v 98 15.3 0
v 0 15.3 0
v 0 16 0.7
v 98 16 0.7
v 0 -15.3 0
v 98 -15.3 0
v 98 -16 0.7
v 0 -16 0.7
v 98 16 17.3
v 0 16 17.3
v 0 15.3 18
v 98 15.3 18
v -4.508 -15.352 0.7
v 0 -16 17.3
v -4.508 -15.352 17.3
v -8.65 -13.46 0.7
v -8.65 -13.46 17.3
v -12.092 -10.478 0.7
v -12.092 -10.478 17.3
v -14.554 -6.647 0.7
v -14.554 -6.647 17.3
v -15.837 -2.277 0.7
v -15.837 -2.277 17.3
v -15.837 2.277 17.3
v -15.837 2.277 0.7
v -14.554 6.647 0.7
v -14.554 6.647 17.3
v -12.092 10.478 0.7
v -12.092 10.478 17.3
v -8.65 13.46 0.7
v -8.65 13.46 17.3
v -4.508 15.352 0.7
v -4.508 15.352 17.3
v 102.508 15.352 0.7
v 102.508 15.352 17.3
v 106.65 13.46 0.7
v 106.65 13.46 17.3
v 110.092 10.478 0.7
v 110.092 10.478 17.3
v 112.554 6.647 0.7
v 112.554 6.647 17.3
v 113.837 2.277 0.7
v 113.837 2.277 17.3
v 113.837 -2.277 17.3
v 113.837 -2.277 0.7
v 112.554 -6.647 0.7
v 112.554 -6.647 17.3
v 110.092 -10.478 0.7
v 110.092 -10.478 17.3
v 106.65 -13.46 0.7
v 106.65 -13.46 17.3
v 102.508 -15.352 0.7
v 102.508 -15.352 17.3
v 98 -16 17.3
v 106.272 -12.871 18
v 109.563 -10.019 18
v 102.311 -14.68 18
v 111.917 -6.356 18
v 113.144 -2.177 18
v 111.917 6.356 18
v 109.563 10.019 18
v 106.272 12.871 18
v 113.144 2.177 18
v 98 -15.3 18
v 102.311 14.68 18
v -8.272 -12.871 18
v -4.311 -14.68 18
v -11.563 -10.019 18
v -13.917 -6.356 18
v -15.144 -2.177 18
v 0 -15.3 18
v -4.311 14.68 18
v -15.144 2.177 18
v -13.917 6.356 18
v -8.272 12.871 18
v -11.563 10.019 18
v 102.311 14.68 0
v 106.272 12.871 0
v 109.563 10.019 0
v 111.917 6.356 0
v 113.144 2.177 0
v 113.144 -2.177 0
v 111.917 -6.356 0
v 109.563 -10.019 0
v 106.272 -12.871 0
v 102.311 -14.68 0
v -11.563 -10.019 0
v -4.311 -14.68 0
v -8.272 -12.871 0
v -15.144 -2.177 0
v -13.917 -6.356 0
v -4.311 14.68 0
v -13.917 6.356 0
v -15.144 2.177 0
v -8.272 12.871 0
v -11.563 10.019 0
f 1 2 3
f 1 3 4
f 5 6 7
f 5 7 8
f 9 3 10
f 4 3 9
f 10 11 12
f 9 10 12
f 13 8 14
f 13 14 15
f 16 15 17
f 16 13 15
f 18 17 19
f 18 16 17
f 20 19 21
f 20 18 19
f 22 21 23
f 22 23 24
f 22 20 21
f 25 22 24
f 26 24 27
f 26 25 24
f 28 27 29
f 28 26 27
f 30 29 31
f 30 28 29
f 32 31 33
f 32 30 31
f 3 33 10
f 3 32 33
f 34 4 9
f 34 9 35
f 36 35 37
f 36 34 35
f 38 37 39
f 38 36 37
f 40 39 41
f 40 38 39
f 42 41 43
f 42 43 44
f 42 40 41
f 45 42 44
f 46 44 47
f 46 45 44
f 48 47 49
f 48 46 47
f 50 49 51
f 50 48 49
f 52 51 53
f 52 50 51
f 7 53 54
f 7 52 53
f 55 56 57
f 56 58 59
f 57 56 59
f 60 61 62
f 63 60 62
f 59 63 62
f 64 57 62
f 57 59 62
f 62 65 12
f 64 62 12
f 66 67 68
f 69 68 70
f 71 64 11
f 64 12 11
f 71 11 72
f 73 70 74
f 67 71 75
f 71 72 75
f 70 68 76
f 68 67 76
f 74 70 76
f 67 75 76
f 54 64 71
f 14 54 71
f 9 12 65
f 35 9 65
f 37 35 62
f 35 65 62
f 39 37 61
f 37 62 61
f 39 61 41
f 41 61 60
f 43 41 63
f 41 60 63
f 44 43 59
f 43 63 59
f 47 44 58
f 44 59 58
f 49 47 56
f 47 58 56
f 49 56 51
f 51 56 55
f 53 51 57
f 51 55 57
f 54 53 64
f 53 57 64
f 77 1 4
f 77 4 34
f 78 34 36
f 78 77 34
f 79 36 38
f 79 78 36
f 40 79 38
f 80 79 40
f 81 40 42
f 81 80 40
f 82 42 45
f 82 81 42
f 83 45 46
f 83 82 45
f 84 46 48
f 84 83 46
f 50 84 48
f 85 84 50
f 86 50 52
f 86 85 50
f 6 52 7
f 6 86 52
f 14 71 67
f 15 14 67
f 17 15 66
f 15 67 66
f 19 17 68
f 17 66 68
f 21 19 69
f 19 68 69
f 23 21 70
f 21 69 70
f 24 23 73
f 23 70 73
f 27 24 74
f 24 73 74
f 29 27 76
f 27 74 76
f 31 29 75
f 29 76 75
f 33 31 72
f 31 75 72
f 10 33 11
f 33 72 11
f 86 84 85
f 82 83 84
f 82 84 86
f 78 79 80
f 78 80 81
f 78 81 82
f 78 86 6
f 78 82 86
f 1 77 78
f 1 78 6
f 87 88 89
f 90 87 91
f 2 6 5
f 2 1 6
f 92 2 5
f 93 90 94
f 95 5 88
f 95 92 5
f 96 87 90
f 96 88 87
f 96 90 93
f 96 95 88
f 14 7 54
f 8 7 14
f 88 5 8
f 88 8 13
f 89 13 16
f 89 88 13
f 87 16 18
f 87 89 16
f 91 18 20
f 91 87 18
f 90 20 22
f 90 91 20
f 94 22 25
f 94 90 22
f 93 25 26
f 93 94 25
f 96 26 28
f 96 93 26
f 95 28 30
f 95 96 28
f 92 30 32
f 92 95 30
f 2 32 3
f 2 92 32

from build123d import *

# Parameters (mm, degrees)
ESTRUSIONE_ESTRUSIONE1_DEPTH = 18
SMUSSO1_SIZE                 = 0.7


with BuildPart() as part:
    # Schizzo1 → Estrusione-Estrusione1 (new body)
    with BuildSketch(Plane.XY):
        with BuildLine():
            Line((0, 16), (98, 16))
            ThreePointArc((98, 16), (114, 0), (98, -16))
            Line((98, -16), (0, -16))
            ThreePointArc((0, -16), (-16, 0), (0, 16))
        make_face()
    extrude(amount=ESTRUSIONE_ESTRUSIONE1_DEPTH)

    # Smusso1
    smusso1_edges = [part.edges().sort_by_distance(p)[0] for p in [
        (114, 0, 18),
        (49, 16, 18),
        (-16, 0, 18),
        (49, 16, 0),
        (114, 0, 0),
        (49, -16, 0),
        (-16, 0, 0),
        (49, -16, 18),
    ]]
    chamfer(smusso1_edges, length=SMUSSO1_SIZE)


solid = part.part
